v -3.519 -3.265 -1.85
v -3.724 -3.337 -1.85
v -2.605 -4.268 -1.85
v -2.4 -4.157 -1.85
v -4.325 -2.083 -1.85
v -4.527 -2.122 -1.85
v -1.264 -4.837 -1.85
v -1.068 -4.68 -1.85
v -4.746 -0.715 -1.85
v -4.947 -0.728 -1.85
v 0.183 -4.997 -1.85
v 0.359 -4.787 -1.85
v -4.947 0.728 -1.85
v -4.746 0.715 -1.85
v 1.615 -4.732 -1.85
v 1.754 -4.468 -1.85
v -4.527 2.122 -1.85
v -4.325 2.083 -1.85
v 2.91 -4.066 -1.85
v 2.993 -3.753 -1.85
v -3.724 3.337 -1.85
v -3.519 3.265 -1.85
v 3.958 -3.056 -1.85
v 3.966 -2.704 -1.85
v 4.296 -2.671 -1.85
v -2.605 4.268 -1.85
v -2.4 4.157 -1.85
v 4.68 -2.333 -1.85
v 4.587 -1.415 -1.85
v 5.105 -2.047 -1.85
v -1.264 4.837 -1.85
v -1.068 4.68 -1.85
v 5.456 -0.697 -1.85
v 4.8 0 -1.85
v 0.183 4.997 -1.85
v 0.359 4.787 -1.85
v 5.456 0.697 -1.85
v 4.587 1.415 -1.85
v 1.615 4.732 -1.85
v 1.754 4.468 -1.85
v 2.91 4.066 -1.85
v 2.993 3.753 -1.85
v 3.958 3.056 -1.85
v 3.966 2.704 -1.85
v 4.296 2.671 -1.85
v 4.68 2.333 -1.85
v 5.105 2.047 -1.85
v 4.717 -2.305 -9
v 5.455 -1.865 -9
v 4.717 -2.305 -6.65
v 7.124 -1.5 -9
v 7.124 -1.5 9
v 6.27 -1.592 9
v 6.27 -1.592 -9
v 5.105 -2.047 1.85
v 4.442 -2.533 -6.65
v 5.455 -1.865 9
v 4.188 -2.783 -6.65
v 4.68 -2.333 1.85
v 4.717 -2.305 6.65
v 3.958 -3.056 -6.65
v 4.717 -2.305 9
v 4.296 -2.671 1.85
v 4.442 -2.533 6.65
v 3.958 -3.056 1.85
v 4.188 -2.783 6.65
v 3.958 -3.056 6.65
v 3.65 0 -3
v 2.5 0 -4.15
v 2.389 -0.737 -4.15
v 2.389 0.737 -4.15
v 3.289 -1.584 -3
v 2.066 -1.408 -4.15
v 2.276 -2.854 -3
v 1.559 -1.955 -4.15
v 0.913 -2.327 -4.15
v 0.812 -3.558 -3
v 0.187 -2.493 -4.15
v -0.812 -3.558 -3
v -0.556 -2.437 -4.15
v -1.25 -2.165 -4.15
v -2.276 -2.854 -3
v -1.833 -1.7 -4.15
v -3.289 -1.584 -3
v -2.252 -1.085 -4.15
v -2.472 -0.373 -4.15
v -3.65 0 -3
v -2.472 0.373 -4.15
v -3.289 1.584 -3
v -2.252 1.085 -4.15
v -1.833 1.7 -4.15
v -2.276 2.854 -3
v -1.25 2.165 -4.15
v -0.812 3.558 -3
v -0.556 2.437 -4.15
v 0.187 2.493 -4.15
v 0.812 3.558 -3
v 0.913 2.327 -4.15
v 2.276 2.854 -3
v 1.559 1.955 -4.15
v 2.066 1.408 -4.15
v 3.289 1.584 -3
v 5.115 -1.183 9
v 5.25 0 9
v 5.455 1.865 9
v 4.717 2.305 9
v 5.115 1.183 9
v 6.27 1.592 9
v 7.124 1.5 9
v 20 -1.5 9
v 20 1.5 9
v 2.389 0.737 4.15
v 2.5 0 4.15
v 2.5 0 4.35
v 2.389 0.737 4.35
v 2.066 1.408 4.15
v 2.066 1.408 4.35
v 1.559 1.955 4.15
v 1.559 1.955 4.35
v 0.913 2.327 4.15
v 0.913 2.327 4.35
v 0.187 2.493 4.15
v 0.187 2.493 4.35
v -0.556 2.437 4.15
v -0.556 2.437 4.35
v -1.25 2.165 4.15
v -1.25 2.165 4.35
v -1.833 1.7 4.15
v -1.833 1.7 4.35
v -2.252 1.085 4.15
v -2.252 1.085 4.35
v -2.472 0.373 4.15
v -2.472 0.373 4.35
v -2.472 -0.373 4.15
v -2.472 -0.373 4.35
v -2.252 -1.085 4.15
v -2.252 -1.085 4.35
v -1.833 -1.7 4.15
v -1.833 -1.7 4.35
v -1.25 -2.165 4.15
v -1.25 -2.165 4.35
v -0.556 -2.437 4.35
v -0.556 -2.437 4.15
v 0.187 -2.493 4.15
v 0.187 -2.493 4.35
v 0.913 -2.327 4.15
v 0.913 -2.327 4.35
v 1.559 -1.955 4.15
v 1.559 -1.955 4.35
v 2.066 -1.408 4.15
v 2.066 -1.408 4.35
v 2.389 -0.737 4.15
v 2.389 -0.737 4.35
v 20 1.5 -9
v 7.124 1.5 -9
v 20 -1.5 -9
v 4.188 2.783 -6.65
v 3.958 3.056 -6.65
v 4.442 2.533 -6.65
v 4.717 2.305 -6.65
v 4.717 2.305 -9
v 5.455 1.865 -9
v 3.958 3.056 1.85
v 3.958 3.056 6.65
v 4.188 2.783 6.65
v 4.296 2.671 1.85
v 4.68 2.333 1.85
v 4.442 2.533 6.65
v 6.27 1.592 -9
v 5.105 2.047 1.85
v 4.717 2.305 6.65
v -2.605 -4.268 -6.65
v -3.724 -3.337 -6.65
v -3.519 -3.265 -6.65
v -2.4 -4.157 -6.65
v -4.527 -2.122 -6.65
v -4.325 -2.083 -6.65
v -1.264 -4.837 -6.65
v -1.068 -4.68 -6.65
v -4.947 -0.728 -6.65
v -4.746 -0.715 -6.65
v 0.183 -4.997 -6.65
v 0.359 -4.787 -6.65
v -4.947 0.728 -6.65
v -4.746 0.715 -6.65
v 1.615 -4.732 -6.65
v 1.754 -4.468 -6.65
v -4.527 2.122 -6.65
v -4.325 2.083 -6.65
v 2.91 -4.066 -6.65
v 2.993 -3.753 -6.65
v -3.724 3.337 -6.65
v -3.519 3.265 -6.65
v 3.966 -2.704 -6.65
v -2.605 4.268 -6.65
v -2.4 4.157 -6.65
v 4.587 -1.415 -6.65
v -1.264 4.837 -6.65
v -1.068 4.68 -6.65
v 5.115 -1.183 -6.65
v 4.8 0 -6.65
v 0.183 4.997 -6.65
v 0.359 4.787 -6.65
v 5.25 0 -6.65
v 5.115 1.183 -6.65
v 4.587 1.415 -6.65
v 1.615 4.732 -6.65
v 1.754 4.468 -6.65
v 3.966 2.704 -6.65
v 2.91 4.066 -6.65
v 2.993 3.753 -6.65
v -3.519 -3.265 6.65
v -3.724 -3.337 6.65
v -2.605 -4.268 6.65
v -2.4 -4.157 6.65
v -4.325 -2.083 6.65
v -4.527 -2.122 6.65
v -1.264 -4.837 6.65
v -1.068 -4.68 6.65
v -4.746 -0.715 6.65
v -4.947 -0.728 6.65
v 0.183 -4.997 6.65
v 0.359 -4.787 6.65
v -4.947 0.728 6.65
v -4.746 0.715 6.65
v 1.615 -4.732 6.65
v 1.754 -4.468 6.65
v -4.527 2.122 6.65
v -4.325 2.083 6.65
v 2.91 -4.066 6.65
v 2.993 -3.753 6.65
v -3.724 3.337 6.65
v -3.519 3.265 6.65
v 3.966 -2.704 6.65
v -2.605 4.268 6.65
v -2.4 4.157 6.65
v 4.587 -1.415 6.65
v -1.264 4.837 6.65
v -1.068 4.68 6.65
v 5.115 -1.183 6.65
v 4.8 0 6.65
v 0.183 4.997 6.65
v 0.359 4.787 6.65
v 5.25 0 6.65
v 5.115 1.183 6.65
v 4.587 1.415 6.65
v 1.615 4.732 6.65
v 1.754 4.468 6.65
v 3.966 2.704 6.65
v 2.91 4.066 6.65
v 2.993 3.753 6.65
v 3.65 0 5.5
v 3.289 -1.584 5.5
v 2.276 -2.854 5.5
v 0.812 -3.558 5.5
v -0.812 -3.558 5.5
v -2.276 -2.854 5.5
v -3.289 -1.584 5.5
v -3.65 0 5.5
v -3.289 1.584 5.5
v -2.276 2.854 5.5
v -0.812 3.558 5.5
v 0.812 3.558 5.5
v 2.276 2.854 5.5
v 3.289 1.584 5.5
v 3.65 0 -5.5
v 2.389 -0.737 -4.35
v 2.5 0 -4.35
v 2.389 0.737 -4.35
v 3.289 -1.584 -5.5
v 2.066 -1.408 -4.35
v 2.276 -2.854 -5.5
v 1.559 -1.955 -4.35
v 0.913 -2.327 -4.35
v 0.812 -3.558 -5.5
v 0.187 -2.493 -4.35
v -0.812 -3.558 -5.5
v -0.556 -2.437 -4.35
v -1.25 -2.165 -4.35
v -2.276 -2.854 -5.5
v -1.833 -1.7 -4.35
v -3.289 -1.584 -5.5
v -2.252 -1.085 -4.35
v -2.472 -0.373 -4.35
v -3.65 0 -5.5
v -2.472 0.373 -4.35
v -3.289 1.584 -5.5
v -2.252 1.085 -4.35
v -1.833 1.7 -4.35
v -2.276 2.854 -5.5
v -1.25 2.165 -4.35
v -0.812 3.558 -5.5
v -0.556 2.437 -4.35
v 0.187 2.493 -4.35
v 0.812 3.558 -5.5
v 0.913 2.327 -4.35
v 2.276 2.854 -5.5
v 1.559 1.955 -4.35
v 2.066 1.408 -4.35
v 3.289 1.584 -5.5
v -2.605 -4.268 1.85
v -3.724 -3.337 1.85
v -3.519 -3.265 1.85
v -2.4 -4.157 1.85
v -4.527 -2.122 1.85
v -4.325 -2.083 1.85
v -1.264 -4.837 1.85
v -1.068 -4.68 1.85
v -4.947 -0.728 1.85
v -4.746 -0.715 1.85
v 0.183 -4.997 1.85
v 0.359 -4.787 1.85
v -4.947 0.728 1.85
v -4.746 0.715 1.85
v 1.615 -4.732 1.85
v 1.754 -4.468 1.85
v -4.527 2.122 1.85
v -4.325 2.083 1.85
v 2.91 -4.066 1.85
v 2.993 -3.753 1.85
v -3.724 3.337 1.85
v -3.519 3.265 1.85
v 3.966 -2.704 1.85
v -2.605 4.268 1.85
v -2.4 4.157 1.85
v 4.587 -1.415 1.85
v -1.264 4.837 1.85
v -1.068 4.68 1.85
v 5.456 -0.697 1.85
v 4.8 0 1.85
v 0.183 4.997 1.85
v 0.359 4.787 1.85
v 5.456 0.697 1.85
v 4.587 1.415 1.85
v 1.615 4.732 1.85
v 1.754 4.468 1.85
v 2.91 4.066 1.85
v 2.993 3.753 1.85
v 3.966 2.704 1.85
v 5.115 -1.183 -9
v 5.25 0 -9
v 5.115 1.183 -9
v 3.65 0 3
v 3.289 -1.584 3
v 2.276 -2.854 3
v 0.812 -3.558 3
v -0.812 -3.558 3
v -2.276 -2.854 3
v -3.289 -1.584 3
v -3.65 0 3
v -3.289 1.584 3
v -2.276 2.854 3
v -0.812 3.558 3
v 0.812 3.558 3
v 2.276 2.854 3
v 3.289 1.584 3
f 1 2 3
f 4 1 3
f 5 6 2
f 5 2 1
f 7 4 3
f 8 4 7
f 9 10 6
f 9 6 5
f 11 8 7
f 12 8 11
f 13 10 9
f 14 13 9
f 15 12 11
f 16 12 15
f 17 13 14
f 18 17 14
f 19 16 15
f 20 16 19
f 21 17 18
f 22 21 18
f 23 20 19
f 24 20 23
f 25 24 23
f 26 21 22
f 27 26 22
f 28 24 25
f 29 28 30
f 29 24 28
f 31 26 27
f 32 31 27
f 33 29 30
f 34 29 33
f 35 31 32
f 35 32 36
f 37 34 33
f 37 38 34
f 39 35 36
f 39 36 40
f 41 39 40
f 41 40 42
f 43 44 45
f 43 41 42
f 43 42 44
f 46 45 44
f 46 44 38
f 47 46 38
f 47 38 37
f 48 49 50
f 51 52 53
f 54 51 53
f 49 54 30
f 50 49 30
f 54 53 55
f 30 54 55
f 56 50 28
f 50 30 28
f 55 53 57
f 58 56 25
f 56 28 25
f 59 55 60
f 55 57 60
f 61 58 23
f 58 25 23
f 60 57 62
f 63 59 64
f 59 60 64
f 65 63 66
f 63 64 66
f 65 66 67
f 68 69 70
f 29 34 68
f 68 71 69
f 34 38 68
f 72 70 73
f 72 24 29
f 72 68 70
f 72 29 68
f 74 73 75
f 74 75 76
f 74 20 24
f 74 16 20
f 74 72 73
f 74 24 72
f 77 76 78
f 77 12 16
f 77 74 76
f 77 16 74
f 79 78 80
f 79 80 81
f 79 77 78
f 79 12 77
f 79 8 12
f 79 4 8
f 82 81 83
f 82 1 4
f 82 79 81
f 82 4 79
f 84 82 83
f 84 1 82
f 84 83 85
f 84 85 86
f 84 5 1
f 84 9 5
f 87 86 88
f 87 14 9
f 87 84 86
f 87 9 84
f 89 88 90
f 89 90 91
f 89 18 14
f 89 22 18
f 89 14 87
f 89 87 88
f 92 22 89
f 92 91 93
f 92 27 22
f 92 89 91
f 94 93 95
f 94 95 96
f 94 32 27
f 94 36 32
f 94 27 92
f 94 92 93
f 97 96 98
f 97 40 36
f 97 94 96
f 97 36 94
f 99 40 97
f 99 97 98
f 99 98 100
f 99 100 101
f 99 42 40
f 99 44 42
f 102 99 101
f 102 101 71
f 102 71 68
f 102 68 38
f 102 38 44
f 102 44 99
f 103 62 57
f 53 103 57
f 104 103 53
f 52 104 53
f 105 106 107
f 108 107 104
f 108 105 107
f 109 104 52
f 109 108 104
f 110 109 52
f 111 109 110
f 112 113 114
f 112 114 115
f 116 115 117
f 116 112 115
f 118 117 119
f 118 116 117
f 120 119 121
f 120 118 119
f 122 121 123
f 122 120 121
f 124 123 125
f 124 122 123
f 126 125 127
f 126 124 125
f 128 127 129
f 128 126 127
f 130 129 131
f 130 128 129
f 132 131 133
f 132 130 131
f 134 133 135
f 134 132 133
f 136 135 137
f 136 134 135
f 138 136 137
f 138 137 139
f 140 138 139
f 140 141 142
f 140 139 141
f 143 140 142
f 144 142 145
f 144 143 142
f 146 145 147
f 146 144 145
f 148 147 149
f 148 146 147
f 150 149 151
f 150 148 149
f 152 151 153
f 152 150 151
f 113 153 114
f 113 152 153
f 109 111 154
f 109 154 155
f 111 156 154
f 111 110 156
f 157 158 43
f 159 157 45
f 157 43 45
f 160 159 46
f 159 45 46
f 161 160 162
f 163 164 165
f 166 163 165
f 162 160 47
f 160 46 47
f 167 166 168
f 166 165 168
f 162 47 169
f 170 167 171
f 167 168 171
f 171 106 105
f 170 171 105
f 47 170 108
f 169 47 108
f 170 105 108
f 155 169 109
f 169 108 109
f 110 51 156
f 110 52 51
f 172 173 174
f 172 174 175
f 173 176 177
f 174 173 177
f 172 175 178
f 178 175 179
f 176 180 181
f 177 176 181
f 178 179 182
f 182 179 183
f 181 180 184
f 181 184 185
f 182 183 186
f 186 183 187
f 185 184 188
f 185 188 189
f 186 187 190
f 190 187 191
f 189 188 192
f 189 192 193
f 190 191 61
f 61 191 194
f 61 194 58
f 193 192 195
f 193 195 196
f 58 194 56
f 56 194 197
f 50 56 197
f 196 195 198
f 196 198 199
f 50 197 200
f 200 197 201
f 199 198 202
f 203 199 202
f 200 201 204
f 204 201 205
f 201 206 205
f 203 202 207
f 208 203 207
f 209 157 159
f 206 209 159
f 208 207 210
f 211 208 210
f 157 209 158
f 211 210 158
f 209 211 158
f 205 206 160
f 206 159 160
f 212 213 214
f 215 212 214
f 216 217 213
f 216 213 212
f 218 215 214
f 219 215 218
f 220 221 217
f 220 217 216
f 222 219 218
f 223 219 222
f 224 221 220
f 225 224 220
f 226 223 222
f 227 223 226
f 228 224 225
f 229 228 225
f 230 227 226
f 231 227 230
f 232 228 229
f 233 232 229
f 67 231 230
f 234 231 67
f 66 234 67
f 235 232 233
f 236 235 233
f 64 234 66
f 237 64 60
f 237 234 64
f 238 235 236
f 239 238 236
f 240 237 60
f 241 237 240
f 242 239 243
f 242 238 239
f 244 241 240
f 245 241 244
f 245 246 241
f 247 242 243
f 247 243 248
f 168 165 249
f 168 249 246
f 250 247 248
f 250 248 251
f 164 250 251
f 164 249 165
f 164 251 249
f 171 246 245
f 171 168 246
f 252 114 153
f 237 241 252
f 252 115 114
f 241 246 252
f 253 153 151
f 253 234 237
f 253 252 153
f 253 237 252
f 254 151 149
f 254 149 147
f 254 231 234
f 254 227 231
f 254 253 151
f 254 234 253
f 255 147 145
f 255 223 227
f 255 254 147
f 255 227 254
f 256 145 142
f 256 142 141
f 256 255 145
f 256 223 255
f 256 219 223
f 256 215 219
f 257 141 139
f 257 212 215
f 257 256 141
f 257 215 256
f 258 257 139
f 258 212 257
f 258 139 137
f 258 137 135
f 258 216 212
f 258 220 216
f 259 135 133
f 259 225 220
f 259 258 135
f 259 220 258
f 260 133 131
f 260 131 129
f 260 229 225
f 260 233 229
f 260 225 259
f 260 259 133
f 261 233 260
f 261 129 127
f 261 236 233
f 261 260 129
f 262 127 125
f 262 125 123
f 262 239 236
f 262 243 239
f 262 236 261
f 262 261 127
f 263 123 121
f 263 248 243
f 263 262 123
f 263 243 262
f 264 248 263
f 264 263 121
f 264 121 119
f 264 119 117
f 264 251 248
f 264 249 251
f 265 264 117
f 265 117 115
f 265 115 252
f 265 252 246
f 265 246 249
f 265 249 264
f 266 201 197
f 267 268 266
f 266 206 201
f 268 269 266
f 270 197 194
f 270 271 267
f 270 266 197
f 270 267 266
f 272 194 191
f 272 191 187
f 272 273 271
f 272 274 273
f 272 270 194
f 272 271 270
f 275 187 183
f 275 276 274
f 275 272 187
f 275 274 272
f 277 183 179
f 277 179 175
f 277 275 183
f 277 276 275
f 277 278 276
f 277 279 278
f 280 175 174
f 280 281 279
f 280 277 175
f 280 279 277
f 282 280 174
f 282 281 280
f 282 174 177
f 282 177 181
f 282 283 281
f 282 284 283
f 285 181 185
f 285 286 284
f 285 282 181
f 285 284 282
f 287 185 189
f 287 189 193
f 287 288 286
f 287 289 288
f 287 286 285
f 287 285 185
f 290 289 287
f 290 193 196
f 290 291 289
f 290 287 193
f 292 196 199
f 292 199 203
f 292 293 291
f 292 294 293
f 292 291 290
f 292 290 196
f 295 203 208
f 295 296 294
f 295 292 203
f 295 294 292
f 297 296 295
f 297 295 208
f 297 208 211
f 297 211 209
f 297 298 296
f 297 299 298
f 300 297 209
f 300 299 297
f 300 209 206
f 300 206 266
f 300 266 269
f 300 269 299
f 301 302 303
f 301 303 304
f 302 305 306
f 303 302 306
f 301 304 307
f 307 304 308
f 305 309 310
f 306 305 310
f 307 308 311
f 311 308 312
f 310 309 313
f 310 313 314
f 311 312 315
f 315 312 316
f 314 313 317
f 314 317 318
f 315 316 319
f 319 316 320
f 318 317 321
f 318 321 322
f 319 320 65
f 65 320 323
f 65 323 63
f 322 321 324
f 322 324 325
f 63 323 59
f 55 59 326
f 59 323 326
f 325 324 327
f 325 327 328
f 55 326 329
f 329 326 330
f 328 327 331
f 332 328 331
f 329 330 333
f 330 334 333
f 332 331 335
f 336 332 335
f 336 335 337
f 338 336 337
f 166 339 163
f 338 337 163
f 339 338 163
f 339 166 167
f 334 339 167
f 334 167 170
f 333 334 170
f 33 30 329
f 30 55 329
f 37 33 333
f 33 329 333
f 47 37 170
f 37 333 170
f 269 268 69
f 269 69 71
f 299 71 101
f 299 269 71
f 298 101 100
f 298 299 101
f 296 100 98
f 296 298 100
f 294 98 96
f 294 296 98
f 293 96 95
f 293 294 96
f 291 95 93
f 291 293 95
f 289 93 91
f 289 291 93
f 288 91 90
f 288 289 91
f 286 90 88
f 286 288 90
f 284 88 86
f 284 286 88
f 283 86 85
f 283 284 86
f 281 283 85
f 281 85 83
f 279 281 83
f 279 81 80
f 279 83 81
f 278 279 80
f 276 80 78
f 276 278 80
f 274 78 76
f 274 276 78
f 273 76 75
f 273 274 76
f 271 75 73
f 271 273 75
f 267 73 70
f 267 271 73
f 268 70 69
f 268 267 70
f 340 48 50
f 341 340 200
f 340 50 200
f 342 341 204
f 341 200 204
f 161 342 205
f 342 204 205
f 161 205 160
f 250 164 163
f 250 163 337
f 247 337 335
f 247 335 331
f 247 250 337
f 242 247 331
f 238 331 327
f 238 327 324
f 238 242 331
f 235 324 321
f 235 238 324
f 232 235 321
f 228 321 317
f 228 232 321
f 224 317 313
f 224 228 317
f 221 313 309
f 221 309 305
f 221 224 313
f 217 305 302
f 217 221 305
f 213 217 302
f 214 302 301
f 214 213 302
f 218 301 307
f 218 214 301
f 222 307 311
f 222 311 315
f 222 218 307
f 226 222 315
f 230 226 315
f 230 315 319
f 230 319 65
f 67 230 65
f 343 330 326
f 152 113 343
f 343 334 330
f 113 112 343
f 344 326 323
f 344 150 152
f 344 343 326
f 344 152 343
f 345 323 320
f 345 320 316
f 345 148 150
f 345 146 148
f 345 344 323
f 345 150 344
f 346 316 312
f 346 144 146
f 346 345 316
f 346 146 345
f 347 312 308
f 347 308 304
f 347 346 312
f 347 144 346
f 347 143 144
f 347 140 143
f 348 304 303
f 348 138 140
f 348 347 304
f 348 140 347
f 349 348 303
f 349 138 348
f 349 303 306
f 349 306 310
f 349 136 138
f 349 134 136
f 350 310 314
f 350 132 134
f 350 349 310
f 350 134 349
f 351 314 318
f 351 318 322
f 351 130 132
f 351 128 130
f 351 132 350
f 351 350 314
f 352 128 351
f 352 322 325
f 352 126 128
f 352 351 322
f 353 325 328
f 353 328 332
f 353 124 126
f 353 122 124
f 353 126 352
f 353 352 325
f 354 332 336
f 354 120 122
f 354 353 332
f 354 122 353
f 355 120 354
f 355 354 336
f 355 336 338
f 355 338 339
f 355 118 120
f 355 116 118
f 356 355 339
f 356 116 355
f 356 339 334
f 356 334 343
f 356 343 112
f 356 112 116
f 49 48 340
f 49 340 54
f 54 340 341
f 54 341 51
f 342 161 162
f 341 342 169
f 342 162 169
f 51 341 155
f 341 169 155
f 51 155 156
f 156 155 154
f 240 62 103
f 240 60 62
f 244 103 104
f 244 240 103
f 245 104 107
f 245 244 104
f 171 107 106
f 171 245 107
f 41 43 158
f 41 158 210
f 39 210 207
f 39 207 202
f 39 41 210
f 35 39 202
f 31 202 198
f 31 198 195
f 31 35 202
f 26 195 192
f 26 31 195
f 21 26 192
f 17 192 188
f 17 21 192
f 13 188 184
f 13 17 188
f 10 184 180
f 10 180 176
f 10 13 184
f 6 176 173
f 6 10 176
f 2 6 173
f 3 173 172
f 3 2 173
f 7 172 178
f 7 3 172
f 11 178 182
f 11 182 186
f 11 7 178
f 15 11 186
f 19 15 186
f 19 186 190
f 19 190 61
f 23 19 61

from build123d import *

# Parameters (mm, degrees)
SKETCH006_R     = 2.5
PAD002_DEPTH    = 9
SKETCH007_R     = 5.5
POCKET001_DEPTH = 1.85
SKETCH008_R     = 5.25
POCKET002_DEPTH = 67.1275389628
CHAMFER001_SIZE = 2.3


with BuildPart() as part:
    # Sketch006 → Pad002 (new body, symmetric)
    with BuildSketch(Plane.XY):
        with BuildLine():
            Line((20, -1.5), (20, 1.5))
            Line((20, 1.5), (7.1239047452, 1.5))
            ThreePointArc((3.9577107596, 3.0555728668), (5.3600599952, 1.9098946593), (7.1239047452, 1.5))
            ThreePointArc((3.9577107595, 3.0555728668), (-5, -2.4792e-06), (3.9577137897, -3.055568942))
            ThreePointArc((7.1239047446, -1.5), (5.3600622201, -1.9098935662), (3.9577137897, -3.055568942))
            Line((7.1239047446, -1.5), (20, -1.5))
        make_face()
        Circle(SKETCH006_R, mode=Mode.SUBTRACT)
    extrude(amount=PAD002_DEPTH, both=True)

    # Sketch007 → Pocket001 (cut, symmetric)
    with BuildSketch(Plane.XY):
        Circle(SKETCH007_R)
    extrude(amount=POCKET001_DEPTH, both=True, mode=Mode.SUBTRACT)

    # Sketch008 → Pocket002 (cut, through all)
    with BuildSketch(Plane.XY.offset(6.65)):
        Circle(SKETCH008_R)
    pocket002 = extrude(amount=POCKET002_DEPTH, mode=Mode.SUBTRACT)

    # Mirrored001: Pocket002 across XY
    add(pocket002.mirror(Plane.XY), mode=Mode.SUBTRACT)

    # Chamfer001
    chamfer001_edges = [part.edges().sort_by_distance(p)[0] for p in [
        (-2.5, 0, -6.65),
        (-2.5, 0, -1.85),
        (-2.5, 0, 6.65),
        (-2.5, 0, 1.85),
    ]]
    chamfer(chamfer001_edges, length=CHAMFER001_SIZE)


solid = part.part
